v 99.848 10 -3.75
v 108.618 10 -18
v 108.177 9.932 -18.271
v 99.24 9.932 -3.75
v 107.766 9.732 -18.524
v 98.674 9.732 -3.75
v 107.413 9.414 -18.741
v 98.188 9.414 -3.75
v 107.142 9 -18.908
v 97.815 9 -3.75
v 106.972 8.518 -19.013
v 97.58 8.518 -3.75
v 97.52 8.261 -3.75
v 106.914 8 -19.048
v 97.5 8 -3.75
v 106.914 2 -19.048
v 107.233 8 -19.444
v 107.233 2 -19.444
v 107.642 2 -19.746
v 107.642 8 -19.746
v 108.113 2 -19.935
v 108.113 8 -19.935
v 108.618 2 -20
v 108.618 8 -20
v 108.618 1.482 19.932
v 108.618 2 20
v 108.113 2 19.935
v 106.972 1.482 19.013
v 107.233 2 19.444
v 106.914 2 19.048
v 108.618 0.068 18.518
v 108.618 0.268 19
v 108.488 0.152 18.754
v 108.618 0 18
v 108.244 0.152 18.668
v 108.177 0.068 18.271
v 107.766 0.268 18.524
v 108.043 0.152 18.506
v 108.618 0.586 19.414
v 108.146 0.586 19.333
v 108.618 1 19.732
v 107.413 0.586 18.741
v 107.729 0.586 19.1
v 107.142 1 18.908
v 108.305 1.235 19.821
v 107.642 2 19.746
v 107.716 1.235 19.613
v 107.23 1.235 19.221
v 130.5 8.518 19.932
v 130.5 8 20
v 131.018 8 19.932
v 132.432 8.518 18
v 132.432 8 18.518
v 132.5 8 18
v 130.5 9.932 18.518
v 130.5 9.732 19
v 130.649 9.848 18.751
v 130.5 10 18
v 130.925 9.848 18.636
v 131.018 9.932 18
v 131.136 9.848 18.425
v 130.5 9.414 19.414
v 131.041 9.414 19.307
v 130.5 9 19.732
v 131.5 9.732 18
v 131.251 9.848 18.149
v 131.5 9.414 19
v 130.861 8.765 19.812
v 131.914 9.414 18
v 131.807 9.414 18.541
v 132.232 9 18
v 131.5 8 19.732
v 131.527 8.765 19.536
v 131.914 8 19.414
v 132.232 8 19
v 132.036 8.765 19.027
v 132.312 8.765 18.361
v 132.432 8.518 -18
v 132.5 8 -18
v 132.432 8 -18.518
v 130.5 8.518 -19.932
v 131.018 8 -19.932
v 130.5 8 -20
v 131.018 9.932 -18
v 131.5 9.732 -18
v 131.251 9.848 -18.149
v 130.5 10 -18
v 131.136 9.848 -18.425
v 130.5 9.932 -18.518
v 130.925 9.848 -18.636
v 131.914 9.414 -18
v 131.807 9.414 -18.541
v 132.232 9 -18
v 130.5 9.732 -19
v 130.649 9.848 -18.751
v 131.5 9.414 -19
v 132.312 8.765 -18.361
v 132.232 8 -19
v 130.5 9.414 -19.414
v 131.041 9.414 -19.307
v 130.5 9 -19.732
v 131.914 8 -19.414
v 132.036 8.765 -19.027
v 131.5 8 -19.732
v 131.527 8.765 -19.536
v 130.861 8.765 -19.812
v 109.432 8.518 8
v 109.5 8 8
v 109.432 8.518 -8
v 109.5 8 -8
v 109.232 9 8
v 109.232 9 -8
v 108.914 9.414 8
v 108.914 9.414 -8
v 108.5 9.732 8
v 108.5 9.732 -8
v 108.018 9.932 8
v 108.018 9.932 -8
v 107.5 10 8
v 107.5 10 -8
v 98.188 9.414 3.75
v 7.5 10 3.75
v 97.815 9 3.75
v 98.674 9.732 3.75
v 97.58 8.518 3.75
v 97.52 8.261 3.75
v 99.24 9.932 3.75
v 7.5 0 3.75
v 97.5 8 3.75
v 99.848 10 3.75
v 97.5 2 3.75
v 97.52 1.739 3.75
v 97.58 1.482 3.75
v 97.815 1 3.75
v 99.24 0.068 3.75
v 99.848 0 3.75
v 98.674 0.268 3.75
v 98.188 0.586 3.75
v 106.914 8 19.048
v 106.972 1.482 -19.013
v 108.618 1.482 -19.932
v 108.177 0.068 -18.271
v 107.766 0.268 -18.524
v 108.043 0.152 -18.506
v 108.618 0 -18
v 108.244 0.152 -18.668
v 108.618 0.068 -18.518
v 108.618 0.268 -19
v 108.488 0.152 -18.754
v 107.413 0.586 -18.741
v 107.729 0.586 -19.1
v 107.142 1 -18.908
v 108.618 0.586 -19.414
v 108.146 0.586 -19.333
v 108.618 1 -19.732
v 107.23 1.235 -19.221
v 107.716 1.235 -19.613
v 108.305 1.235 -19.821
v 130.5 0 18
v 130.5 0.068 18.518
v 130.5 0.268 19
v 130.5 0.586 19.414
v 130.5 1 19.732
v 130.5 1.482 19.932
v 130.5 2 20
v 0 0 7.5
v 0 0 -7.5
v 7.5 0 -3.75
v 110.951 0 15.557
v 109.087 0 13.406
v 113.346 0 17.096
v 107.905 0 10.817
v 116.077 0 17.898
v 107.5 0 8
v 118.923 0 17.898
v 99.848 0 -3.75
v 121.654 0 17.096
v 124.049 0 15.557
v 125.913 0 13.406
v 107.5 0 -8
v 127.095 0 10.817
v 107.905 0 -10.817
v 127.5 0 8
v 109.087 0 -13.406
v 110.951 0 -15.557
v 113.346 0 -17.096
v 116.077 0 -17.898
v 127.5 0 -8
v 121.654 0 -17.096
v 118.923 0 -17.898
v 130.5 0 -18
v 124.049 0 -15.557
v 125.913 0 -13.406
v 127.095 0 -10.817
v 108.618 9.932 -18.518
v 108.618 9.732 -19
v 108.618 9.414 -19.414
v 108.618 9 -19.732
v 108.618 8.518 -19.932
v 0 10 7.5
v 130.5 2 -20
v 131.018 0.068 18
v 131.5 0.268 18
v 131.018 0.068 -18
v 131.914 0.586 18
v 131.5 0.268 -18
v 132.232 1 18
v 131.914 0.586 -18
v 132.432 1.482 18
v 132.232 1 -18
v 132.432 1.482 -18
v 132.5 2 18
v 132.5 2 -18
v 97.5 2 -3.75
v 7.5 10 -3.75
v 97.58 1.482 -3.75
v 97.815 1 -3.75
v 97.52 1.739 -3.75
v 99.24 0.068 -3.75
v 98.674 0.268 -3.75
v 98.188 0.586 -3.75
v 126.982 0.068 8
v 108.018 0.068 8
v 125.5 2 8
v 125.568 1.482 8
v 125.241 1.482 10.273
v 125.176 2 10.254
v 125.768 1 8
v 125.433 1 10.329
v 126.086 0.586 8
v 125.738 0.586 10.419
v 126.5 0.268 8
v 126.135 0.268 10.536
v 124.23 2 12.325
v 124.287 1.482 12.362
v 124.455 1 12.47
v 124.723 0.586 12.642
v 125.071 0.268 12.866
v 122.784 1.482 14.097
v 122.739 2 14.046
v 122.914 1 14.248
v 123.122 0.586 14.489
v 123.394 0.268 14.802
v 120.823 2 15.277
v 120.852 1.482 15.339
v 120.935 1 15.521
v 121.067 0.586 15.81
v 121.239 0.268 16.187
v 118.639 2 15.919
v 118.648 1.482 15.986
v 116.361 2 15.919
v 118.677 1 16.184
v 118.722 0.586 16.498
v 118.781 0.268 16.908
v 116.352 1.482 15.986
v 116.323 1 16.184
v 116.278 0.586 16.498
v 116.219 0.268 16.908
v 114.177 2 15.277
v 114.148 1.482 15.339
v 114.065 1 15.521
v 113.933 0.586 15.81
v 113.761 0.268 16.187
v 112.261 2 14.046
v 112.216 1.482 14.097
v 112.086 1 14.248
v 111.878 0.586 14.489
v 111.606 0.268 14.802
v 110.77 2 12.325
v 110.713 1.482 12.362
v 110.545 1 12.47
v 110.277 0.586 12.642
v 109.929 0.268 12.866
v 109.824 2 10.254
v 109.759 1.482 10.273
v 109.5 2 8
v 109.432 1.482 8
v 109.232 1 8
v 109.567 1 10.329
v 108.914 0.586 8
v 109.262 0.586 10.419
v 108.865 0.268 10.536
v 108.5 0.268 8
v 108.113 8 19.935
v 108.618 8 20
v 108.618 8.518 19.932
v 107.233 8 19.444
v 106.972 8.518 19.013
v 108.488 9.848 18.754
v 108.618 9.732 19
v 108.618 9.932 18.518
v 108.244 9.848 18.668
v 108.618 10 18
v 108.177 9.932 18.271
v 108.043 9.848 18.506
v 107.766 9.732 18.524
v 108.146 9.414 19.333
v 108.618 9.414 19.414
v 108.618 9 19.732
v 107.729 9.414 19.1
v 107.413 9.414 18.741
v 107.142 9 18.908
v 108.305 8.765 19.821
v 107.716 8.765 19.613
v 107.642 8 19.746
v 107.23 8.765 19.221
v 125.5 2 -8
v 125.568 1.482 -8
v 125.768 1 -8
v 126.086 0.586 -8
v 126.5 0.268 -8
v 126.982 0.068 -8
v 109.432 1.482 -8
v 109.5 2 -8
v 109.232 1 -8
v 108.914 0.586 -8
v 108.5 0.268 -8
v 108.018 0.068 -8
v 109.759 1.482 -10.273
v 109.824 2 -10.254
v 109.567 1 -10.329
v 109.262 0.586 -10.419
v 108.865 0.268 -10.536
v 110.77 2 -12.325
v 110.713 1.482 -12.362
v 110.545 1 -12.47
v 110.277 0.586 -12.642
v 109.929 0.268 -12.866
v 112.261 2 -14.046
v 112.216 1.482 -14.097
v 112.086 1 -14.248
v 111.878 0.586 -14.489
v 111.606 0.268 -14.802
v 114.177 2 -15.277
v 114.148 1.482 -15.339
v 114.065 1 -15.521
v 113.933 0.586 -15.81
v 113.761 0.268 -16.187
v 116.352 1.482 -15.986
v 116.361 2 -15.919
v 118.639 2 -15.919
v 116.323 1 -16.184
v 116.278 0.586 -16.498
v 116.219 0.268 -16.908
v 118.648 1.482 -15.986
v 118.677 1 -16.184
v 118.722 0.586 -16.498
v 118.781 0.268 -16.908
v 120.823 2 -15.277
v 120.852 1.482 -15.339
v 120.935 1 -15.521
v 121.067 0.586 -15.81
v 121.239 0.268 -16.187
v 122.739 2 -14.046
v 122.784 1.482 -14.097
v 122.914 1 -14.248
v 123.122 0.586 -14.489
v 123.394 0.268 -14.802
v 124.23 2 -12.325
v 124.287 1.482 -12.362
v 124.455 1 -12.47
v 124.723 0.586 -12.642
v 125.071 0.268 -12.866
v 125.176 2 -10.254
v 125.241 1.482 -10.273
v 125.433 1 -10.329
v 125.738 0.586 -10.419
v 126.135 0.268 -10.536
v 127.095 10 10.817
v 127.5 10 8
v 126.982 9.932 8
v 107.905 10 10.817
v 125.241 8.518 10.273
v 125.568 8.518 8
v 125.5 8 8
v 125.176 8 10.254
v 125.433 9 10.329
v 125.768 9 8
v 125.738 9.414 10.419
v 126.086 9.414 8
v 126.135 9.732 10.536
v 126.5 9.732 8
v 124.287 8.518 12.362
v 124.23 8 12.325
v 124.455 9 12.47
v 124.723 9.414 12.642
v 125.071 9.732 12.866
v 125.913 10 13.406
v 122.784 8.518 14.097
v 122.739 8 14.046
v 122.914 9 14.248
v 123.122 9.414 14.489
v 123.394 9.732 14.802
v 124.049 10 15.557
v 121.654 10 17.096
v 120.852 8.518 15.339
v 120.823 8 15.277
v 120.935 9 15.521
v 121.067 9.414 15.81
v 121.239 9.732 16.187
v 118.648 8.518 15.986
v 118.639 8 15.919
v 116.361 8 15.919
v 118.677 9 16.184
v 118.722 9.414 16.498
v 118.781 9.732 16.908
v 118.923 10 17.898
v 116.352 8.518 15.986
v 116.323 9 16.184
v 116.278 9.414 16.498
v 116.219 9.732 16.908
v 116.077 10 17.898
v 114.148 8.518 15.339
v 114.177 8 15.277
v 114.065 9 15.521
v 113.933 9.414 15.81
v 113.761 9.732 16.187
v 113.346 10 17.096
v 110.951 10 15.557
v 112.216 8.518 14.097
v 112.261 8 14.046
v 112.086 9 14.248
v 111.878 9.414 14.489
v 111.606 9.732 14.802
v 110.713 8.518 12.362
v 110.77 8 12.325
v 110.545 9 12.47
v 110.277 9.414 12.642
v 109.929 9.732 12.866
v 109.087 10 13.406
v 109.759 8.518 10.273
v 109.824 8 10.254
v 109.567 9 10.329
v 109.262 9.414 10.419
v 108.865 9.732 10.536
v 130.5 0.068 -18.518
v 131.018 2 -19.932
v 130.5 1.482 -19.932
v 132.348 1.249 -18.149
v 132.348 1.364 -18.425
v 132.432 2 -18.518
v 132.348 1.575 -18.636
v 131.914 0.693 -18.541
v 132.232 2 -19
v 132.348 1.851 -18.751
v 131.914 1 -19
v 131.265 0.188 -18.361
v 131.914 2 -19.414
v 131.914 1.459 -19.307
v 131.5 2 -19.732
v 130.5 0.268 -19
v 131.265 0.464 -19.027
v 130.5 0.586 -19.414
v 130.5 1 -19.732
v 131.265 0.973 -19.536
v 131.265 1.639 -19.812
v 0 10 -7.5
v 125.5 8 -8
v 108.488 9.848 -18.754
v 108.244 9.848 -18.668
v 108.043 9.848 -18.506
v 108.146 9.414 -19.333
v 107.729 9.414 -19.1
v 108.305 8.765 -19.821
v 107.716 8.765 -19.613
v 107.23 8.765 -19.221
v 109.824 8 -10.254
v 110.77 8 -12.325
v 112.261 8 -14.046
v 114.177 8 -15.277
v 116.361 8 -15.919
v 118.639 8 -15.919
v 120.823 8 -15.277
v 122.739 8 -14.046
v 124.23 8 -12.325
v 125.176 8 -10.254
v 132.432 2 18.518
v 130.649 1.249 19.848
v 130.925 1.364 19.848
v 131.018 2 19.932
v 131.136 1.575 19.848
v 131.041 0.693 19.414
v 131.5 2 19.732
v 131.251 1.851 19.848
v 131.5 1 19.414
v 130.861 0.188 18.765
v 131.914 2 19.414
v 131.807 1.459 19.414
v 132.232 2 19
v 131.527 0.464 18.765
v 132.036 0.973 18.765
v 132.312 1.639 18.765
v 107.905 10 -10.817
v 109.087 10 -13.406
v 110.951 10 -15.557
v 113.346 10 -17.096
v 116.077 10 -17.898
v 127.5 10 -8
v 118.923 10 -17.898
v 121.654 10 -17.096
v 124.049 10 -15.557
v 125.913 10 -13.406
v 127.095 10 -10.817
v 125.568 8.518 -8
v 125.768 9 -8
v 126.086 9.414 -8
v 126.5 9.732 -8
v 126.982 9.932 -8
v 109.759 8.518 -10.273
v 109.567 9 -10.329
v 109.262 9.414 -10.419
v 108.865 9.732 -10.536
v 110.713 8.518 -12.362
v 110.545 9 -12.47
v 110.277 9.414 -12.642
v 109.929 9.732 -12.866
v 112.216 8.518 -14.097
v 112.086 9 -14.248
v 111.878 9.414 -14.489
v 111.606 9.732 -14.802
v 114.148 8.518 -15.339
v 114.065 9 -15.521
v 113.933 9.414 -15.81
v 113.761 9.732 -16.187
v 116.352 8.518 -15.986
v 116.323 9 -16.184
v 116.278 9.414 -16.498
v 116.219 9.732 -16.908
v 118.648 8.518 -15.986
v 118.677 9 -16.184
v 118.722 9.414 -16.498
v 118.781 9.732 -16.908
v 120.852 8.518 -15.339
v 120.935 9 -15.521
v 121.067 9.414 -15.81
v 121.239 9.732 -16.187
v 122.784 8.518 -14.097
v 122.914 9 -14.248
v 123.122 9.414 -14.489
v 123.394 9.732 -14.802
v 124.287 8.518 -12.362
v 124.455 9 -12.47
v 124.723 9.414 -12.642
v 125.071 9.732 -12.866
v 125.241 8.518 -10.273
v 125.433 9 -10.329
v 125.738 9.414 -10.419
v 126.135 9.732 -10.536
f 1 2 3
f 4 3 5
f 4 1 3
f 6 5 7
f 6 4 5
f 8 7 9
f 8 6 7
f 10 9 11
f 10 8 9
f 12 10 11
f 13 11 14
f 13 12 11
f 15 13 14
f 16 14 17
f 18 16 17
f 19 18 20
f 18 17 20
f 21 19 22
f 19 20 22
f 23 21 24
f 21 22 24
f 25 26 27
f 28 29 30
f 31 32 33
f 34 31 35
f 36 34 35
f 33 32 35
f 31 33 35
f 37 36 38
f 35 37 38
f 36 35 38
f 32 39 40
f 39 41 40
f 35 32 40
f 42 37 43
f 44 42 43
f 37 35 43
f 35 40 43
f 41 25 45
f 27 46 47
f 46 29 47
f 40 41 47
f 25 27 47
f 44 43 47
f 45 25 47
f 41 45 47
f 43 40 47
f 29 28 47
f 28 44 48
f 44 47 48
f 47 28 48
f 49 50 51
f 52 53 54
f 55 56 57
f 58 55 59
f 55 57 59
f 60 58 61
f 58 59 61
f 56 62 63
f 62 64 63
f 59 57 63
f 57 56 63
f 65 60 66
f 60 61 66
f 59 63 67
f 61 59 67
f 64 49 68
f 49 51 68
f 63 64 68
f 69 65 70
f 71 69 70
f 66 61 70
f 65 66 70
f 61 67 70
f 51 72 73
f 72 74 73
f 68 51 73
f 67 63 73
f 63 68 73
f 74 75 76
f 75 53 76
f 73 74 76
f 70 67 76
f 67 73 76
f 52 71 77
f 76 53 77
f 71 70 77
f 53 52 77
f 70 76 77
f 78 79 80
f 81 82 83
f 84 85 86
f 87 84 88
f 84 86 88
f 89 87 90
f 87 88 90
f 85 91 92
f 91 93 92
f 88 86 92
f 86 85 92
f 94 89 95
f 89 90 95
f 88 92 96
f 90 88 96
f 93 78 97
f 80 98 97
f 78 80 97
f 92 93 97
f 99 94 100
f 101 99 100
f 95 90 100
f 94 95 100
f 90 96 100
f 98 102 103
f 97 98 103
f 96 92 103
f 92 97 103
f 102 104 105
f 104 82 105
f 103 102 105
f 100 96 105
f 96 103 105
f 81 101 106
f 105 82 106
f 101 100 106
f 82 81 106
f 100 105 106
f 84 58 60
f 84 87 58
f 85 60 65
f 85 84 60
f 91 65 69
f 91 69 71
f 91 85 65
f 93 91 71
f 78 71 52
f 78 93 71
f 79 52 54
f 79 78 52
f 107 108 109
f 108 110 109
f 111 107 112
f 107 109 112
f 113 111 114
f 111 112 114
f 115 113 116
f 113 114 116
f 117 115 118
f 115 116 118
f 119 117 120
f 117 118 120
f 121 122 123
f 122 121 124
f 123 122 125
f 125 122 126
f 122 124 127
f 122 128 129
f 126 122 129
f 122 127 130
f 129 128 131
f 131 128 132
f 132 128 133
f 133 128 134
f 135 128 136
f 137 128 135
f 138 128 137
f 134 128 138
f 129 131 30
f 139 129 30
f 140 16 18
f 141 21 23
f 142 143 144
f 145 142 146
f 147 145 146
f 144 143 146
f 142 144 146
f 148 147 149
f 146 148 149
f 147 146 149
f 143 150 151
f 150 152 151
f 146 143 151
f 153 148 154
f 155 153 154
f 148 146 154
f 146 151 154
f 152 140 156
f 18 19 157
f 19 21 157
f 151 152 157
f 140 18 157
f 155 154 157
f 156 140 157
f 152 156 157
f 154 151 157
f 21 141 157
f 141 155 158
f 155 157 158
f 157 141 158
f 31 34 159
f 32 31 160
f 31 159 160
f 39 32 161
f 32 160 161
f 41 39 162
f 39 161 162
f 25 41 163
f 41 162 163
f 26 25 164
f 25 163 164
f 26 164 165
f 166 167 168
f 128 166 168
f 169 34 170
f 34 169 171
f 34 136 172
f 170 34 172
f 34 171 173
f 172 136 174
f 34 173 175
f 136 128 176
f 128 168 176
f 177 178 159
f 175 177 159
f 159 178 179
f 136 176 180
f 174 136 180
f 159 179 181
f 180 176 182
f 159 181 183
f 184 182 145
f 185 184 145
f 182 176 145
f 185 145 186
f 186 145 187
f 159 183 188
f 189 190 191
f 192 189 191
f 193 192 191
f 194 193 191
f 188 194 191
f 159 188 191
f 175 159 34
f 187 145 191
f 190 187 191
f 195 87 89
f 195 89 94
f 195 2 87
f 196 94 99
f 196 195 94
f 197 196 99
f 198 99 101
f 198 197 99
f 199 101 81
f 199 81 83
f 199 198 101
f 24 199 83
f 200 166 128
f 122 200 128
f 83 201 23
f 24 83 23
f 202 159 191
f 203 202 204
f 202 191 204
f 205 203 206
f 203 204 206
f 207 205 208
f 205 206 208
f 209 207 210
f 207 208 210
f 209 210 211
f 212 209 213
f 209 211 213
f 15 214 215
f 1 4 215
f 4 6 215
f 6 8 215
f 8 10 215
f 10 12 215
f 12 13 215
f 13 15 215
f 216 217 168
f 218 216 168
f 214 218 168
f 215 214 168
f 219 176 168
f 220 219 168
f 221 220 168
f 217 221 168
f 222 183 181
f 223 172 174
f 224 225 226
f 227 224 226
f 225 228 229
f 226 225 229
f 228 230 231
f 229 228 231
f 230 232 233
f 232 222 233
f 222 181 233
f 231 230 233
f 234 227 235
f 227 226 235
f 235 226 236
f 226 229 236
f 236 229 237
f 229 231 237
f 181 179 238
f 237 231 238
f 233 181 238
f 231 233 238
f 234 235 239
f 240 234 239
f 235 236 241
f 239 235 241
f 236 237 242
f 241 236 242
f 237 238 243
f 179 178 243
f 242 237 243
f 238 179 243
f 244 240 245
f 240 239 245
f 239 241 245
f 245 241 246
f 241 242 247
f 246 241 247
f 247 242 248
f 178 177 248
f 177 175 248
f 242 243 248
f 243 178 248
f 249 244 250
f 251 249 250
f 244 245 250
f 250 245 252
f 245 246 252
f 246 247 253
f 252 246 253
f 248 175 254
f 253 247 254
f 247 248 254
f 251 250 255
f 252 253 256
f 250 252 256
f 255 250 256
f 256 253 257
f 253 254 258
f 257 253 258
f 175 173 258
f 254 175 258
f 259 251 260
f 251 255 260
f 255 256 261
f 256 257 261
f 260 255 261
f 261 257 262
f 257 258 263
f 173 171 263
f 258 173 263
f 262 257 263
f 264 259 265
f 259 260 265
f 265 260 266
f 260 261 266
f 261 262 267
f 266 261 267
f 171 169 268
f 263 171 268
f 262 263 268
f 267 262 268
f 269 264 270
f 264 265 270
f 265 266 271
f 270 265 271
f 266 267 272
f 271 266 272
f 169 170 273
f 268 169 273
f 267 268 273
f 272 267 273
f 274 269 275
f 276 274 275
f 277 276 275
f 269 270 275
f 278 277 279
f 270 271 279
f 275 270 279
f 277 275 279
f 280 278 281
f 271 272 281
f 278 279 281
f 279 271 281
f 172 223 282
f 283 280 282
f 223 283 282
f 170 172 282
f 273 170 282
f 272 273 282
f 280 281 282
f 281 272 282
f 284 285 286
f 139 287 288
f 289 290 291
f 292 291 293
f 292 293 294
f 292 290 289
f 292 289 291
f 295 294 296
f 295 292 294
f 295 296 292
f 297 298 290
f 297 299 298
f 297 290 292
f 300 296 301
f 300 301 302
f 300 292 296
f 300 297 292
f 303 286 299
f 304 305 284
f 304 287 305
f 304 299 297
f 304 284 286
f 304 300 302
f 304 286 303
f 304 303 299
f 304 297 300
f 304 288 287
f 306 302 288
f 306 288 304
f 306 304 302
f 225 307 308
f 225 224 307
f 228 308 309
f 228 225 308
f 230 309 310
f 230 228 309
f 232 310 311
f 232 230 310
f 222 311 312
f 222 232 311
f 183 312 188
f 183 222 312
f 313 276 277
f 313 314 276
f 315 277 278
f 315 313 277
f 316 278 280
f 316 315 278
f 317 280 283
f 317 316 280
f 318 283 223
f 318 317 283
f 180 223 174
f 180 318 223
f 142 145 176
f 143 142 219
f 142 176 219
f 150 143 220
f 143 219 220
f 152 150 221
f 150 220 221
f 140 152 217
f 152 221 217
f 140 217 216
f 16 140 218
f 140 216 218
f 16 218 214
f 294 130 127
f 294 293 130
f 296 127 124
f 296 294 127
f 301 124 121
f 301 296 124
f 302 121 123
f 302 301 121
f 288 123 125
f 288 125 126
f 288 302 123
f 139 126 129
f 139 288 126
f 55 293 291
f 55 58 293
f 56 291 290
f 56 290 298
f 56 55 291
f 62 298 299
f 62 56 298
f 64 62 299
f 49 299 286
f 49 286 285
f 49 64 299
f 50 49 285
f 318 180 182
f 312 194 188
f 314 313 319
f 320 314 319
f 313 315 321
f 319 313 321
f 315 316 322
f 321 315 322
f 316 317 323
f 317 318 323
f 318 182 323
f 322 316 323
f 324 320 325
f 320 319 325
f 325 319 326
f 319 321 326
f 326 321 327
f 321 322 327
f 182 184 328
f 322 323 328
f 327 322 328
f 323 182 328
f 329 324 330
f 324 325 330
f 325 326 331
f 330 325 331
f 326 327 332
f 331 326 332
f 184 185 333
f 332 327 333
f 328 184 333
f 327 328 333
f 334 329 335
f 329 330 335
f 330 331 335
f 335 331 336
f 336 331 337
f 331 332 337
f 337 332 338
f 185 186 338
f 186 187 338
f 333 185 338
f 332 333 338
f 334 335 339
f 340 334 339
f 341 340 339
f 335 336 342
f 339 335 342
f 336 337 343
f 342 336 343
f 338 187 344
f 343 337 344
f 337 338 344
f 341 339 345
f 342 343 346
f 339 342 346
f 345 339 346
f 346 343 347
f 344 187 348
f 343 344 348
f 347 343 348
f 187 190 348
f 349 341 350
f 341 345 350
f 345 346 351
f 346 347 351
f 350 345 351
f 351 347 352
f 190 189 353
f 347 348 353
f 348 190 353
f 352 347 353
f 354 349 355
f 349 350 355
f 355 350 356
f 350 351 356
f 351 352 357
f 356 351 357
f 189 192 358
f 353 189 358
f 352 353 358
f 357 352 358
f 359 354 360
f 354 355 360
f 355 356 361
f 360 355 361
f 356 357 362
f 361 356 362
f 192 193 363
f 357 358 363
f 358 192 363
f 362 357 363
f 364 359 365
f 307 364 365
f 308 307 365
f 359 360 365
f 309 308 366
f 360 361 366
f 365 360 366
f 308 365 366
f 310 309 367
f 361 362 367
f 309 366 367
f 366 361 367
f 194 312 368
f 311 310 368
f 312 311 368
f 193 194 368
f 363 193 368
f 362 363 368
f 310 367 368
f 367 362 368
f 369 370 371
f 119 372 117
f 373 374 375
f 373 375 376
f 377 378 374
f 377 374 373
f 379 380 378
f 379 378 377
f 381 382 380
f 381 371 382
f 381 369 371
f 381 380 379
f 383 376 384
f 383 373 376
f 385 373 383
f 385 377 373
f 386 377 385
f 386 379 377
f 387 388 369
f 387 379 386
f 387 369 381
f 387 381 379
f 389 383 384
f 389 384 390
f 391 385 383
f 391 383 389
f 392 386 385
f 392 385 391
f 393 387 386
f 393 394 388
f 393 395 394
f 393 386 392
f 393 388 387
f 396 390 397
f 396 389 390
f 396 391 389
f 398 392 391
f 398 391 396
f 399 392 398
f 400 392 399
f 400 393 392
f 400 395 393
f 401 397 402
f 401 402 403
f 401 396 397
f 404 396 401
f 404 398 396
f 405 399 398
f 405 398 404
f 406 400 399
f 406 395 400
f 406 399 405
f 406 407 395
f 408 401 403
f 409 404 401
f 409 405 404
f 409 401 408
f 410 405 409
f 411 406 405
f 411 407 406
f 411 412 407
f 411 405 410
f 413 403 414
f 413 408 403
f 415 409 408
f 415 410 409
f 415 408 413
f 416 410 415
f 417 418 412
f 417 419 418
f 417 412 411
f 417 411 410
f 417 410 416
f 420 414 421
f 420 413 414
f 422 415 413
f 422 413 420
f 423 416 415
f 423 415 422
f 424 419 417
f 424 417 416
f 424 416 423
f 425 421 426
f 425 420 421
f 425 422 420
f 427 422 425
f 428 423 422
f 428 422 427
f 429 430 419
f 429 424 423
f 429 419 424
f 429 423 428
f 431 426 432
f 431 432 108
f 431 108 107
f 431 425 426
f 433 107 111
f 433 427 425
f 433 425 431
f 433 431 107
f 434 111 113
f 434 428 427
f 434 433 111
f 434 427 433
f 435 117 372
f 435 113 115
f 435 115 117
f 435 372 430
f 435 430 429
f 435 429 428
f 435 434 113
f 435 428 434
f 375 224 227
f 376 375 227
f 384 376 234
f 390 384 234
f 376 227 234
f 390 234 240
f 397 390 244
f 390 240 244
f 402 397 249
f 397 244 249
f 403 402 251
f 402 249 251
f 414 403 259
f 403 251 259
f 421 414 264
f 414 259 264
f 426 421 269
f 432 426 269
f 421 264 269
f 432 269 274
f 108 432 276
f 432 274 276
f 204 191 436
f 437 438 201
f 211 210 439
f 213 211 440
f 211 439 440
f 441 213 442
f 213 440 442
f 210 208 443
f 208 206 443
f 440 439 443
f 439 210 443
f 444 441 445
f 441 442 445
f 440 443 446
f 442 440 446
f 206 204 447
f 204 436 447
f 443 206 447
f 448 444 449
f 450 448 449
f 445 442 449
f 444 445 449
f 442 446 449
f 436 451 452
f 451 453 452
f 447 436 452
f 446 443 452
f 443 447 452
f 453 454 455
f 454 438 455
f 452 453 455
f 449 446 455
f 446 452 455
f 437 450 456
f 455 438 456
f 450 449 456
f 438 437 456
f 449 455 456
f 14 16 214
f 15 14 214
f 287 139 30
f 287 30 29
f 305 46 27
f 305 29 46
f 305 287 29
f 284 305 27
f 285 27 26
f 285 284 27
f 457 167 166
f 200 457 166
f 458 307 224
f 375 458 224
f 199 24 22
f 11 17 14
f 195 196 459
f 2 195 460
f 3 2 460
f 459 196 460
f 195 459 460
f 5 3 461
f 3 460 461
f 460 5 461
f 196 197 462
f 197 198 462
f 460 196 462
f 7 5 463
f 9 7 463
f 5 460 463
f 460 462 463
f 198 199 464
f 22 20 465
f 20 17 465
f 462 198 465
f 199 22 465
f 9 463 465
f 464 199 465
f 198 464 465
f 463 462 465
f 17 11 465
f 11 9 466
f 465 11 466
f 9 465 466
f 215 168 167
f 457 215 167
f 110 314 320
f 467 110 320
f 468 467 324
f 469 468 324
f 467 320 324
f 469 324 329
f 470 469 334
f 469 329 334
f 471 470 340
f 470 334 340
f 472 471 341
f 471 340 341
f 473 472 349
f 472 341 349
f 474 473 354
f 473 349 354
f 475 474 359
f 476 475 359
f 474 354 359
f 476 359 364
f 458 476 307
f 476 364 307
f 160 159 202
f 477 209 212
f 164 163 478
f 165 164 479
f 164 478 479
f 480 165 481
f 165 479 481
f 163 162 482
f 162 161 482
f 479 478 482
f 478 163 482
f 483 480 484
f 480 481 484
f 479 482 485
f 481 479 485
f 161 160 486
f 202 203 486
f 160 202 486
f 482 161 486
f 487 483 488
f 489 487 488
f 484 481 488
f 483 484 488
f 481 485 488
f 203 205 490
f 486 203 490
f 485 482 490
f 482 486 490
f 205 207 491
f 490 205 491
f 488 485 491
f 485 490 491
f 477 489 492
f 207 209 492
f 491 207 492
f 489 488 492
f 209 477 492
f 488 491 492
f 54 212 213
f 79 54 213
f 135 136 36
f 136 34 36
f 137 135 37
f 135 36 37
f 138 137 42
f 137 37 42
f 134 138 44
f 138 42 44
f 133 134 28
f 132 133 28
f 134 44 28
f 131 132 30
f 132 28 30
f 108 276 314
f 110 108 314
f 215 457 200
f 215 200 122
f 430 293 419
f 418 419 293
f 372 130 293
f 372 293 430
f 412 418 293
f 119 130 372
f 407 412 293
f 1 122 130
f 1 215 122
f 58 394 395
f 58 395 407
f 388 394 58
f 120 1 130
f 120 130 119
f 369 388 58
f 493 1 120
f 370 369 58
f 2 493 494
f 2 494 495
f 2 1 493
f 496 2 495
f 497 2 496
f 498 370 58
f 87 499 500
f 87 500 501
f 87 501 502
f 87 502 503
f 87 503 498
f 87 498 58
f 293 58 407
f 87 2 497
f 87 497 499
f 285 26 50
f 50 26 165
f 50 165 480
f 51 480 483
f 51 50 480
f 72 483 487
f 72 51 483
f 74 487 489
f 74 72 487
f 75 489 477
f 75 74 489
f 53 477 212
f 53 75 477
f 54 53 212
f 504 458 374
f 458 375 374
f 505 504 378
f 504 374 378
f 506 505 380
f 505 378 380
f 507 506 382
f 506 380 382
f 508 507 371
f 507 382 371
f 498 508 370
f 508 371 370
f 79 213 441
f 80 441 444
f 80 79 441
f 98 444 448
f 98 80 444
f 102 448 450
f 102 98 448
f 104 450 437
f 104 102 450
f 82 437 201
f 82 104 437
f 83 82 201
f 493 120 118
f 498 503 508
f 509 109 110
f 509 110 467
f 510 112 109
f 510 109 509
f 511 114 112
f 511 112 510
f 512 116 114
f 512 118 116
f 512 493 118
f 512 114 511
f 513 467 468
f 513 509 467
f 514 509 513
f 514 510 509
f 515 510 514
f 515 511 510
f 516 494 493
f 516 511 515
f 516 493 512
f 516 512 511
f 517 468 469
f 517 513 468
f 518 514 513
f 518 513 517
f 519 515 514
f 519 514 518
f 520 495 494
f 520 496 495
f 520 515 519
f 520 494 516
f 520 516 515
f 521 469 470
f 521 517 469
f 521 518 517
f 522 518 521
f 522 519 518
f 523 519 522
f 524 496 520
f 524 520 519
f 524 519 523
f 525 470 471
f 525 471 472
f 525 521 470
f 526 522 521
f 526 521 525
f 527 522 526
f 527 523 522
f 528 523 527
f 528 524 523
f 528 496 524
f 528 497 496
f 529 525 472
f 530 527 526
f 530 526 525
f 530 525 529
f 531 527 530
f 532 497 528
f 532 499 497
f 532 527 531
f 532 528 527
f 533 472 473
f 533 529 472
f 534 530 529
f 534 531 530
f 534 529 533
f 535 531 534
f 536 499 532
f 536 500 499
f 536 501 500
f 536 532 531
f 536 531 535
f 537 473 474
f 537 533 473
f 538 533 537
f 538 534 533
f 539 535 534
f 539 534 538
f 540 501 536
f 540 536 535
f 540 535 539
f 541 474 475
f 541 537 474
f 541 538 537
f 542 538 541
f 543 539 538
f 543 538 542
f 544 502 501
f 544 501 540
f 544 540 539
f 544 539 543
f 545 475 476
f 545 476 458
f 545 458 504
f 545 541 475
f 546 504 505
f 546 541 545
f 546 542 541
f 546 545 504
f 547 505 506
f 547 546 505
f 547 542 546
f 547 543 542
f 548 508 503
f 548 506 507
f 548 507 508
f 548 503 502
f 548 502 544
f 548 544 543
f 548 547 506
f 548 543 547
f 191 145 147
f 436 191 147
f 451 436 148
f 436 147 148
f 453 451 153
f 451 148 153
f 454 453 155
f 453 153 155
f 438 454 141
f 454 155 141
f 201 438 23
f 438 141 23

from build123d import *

# Parameters (mm, degrees)
BOSS_EXTRUDE1_DEPTH = 10
FILLET1_R           = 2
FILLET2_R           = 2


with BuildPart() as part:
    # Sketch1 → Boss-Extrude1 (new body)
    with BuildSketch(Plane(origin=(0, 0, 0), x_dir=(1, 0, 0), z_dir=(0, 1, 0))):
        Polygon((0, 0), (0, -7.5), (7.5, -3.75), (97.5, -3.75), (107.5, -20), (132.5, -20), (132.5, 20), (107.5, 20), (97.5, 3.75), (7.5, 3.75), (0, 7.5), align=None)
        with BuildLine():
            Line((125.5, 8), (125.5, -8))
            ThreePointArc((125.5, -8), (117.5, -16), (109.5, -8))
            Line((109.5, -8), (109.5, 8))
            ThreePointArc((109.5, 8), (117.5, 16), (125.5, 8))
        make_face(mode=Mode.SUBTRACT)
    extrude(amount=BOSS_EXTRUDE1_DEPTH)

    # Fillet1
    fillet1_edges = [part.edges().sort_by_distance(p)[0] for p in [
        (117.5, 0, -16),
        (109.5, 0, 0),
        (117.5, 0, 16),
        (125.5, 0, 0),
        (117.5, 10, -16),
        (109.5, 10, 0),
        (117.5, 10, 16),
        (125.5, 10, 0),
    ]]
    fillet(fillet1_edges, radius=FILLET1_R)

    # Fillet2
    fillet2_edges = [part.edges().sort_by_distance(p)[0] for p in [
        (102.5, 0, -11.875),
        (120, 0, -20),
        (132.5, 0, 0),
        (120, 0, 20),
        (102.5, 0, 11.875),
        (102.5, 10, 11.875),
        (107.5, 5, -20),
        (132.5, 5, -20),
        (132.5, 5, 20),
        (107.5, 5, 20),
        (120, 10, 20),
        (132.5, 10, 0),
        (120, 10, -20),
        (102.5, 10, -11.875),
    ]]
    fillet(fillet2_edges, radius=FILLET2_R - 0.0001)  # a hair under: the kernel refuses the full size


solid = part.part
